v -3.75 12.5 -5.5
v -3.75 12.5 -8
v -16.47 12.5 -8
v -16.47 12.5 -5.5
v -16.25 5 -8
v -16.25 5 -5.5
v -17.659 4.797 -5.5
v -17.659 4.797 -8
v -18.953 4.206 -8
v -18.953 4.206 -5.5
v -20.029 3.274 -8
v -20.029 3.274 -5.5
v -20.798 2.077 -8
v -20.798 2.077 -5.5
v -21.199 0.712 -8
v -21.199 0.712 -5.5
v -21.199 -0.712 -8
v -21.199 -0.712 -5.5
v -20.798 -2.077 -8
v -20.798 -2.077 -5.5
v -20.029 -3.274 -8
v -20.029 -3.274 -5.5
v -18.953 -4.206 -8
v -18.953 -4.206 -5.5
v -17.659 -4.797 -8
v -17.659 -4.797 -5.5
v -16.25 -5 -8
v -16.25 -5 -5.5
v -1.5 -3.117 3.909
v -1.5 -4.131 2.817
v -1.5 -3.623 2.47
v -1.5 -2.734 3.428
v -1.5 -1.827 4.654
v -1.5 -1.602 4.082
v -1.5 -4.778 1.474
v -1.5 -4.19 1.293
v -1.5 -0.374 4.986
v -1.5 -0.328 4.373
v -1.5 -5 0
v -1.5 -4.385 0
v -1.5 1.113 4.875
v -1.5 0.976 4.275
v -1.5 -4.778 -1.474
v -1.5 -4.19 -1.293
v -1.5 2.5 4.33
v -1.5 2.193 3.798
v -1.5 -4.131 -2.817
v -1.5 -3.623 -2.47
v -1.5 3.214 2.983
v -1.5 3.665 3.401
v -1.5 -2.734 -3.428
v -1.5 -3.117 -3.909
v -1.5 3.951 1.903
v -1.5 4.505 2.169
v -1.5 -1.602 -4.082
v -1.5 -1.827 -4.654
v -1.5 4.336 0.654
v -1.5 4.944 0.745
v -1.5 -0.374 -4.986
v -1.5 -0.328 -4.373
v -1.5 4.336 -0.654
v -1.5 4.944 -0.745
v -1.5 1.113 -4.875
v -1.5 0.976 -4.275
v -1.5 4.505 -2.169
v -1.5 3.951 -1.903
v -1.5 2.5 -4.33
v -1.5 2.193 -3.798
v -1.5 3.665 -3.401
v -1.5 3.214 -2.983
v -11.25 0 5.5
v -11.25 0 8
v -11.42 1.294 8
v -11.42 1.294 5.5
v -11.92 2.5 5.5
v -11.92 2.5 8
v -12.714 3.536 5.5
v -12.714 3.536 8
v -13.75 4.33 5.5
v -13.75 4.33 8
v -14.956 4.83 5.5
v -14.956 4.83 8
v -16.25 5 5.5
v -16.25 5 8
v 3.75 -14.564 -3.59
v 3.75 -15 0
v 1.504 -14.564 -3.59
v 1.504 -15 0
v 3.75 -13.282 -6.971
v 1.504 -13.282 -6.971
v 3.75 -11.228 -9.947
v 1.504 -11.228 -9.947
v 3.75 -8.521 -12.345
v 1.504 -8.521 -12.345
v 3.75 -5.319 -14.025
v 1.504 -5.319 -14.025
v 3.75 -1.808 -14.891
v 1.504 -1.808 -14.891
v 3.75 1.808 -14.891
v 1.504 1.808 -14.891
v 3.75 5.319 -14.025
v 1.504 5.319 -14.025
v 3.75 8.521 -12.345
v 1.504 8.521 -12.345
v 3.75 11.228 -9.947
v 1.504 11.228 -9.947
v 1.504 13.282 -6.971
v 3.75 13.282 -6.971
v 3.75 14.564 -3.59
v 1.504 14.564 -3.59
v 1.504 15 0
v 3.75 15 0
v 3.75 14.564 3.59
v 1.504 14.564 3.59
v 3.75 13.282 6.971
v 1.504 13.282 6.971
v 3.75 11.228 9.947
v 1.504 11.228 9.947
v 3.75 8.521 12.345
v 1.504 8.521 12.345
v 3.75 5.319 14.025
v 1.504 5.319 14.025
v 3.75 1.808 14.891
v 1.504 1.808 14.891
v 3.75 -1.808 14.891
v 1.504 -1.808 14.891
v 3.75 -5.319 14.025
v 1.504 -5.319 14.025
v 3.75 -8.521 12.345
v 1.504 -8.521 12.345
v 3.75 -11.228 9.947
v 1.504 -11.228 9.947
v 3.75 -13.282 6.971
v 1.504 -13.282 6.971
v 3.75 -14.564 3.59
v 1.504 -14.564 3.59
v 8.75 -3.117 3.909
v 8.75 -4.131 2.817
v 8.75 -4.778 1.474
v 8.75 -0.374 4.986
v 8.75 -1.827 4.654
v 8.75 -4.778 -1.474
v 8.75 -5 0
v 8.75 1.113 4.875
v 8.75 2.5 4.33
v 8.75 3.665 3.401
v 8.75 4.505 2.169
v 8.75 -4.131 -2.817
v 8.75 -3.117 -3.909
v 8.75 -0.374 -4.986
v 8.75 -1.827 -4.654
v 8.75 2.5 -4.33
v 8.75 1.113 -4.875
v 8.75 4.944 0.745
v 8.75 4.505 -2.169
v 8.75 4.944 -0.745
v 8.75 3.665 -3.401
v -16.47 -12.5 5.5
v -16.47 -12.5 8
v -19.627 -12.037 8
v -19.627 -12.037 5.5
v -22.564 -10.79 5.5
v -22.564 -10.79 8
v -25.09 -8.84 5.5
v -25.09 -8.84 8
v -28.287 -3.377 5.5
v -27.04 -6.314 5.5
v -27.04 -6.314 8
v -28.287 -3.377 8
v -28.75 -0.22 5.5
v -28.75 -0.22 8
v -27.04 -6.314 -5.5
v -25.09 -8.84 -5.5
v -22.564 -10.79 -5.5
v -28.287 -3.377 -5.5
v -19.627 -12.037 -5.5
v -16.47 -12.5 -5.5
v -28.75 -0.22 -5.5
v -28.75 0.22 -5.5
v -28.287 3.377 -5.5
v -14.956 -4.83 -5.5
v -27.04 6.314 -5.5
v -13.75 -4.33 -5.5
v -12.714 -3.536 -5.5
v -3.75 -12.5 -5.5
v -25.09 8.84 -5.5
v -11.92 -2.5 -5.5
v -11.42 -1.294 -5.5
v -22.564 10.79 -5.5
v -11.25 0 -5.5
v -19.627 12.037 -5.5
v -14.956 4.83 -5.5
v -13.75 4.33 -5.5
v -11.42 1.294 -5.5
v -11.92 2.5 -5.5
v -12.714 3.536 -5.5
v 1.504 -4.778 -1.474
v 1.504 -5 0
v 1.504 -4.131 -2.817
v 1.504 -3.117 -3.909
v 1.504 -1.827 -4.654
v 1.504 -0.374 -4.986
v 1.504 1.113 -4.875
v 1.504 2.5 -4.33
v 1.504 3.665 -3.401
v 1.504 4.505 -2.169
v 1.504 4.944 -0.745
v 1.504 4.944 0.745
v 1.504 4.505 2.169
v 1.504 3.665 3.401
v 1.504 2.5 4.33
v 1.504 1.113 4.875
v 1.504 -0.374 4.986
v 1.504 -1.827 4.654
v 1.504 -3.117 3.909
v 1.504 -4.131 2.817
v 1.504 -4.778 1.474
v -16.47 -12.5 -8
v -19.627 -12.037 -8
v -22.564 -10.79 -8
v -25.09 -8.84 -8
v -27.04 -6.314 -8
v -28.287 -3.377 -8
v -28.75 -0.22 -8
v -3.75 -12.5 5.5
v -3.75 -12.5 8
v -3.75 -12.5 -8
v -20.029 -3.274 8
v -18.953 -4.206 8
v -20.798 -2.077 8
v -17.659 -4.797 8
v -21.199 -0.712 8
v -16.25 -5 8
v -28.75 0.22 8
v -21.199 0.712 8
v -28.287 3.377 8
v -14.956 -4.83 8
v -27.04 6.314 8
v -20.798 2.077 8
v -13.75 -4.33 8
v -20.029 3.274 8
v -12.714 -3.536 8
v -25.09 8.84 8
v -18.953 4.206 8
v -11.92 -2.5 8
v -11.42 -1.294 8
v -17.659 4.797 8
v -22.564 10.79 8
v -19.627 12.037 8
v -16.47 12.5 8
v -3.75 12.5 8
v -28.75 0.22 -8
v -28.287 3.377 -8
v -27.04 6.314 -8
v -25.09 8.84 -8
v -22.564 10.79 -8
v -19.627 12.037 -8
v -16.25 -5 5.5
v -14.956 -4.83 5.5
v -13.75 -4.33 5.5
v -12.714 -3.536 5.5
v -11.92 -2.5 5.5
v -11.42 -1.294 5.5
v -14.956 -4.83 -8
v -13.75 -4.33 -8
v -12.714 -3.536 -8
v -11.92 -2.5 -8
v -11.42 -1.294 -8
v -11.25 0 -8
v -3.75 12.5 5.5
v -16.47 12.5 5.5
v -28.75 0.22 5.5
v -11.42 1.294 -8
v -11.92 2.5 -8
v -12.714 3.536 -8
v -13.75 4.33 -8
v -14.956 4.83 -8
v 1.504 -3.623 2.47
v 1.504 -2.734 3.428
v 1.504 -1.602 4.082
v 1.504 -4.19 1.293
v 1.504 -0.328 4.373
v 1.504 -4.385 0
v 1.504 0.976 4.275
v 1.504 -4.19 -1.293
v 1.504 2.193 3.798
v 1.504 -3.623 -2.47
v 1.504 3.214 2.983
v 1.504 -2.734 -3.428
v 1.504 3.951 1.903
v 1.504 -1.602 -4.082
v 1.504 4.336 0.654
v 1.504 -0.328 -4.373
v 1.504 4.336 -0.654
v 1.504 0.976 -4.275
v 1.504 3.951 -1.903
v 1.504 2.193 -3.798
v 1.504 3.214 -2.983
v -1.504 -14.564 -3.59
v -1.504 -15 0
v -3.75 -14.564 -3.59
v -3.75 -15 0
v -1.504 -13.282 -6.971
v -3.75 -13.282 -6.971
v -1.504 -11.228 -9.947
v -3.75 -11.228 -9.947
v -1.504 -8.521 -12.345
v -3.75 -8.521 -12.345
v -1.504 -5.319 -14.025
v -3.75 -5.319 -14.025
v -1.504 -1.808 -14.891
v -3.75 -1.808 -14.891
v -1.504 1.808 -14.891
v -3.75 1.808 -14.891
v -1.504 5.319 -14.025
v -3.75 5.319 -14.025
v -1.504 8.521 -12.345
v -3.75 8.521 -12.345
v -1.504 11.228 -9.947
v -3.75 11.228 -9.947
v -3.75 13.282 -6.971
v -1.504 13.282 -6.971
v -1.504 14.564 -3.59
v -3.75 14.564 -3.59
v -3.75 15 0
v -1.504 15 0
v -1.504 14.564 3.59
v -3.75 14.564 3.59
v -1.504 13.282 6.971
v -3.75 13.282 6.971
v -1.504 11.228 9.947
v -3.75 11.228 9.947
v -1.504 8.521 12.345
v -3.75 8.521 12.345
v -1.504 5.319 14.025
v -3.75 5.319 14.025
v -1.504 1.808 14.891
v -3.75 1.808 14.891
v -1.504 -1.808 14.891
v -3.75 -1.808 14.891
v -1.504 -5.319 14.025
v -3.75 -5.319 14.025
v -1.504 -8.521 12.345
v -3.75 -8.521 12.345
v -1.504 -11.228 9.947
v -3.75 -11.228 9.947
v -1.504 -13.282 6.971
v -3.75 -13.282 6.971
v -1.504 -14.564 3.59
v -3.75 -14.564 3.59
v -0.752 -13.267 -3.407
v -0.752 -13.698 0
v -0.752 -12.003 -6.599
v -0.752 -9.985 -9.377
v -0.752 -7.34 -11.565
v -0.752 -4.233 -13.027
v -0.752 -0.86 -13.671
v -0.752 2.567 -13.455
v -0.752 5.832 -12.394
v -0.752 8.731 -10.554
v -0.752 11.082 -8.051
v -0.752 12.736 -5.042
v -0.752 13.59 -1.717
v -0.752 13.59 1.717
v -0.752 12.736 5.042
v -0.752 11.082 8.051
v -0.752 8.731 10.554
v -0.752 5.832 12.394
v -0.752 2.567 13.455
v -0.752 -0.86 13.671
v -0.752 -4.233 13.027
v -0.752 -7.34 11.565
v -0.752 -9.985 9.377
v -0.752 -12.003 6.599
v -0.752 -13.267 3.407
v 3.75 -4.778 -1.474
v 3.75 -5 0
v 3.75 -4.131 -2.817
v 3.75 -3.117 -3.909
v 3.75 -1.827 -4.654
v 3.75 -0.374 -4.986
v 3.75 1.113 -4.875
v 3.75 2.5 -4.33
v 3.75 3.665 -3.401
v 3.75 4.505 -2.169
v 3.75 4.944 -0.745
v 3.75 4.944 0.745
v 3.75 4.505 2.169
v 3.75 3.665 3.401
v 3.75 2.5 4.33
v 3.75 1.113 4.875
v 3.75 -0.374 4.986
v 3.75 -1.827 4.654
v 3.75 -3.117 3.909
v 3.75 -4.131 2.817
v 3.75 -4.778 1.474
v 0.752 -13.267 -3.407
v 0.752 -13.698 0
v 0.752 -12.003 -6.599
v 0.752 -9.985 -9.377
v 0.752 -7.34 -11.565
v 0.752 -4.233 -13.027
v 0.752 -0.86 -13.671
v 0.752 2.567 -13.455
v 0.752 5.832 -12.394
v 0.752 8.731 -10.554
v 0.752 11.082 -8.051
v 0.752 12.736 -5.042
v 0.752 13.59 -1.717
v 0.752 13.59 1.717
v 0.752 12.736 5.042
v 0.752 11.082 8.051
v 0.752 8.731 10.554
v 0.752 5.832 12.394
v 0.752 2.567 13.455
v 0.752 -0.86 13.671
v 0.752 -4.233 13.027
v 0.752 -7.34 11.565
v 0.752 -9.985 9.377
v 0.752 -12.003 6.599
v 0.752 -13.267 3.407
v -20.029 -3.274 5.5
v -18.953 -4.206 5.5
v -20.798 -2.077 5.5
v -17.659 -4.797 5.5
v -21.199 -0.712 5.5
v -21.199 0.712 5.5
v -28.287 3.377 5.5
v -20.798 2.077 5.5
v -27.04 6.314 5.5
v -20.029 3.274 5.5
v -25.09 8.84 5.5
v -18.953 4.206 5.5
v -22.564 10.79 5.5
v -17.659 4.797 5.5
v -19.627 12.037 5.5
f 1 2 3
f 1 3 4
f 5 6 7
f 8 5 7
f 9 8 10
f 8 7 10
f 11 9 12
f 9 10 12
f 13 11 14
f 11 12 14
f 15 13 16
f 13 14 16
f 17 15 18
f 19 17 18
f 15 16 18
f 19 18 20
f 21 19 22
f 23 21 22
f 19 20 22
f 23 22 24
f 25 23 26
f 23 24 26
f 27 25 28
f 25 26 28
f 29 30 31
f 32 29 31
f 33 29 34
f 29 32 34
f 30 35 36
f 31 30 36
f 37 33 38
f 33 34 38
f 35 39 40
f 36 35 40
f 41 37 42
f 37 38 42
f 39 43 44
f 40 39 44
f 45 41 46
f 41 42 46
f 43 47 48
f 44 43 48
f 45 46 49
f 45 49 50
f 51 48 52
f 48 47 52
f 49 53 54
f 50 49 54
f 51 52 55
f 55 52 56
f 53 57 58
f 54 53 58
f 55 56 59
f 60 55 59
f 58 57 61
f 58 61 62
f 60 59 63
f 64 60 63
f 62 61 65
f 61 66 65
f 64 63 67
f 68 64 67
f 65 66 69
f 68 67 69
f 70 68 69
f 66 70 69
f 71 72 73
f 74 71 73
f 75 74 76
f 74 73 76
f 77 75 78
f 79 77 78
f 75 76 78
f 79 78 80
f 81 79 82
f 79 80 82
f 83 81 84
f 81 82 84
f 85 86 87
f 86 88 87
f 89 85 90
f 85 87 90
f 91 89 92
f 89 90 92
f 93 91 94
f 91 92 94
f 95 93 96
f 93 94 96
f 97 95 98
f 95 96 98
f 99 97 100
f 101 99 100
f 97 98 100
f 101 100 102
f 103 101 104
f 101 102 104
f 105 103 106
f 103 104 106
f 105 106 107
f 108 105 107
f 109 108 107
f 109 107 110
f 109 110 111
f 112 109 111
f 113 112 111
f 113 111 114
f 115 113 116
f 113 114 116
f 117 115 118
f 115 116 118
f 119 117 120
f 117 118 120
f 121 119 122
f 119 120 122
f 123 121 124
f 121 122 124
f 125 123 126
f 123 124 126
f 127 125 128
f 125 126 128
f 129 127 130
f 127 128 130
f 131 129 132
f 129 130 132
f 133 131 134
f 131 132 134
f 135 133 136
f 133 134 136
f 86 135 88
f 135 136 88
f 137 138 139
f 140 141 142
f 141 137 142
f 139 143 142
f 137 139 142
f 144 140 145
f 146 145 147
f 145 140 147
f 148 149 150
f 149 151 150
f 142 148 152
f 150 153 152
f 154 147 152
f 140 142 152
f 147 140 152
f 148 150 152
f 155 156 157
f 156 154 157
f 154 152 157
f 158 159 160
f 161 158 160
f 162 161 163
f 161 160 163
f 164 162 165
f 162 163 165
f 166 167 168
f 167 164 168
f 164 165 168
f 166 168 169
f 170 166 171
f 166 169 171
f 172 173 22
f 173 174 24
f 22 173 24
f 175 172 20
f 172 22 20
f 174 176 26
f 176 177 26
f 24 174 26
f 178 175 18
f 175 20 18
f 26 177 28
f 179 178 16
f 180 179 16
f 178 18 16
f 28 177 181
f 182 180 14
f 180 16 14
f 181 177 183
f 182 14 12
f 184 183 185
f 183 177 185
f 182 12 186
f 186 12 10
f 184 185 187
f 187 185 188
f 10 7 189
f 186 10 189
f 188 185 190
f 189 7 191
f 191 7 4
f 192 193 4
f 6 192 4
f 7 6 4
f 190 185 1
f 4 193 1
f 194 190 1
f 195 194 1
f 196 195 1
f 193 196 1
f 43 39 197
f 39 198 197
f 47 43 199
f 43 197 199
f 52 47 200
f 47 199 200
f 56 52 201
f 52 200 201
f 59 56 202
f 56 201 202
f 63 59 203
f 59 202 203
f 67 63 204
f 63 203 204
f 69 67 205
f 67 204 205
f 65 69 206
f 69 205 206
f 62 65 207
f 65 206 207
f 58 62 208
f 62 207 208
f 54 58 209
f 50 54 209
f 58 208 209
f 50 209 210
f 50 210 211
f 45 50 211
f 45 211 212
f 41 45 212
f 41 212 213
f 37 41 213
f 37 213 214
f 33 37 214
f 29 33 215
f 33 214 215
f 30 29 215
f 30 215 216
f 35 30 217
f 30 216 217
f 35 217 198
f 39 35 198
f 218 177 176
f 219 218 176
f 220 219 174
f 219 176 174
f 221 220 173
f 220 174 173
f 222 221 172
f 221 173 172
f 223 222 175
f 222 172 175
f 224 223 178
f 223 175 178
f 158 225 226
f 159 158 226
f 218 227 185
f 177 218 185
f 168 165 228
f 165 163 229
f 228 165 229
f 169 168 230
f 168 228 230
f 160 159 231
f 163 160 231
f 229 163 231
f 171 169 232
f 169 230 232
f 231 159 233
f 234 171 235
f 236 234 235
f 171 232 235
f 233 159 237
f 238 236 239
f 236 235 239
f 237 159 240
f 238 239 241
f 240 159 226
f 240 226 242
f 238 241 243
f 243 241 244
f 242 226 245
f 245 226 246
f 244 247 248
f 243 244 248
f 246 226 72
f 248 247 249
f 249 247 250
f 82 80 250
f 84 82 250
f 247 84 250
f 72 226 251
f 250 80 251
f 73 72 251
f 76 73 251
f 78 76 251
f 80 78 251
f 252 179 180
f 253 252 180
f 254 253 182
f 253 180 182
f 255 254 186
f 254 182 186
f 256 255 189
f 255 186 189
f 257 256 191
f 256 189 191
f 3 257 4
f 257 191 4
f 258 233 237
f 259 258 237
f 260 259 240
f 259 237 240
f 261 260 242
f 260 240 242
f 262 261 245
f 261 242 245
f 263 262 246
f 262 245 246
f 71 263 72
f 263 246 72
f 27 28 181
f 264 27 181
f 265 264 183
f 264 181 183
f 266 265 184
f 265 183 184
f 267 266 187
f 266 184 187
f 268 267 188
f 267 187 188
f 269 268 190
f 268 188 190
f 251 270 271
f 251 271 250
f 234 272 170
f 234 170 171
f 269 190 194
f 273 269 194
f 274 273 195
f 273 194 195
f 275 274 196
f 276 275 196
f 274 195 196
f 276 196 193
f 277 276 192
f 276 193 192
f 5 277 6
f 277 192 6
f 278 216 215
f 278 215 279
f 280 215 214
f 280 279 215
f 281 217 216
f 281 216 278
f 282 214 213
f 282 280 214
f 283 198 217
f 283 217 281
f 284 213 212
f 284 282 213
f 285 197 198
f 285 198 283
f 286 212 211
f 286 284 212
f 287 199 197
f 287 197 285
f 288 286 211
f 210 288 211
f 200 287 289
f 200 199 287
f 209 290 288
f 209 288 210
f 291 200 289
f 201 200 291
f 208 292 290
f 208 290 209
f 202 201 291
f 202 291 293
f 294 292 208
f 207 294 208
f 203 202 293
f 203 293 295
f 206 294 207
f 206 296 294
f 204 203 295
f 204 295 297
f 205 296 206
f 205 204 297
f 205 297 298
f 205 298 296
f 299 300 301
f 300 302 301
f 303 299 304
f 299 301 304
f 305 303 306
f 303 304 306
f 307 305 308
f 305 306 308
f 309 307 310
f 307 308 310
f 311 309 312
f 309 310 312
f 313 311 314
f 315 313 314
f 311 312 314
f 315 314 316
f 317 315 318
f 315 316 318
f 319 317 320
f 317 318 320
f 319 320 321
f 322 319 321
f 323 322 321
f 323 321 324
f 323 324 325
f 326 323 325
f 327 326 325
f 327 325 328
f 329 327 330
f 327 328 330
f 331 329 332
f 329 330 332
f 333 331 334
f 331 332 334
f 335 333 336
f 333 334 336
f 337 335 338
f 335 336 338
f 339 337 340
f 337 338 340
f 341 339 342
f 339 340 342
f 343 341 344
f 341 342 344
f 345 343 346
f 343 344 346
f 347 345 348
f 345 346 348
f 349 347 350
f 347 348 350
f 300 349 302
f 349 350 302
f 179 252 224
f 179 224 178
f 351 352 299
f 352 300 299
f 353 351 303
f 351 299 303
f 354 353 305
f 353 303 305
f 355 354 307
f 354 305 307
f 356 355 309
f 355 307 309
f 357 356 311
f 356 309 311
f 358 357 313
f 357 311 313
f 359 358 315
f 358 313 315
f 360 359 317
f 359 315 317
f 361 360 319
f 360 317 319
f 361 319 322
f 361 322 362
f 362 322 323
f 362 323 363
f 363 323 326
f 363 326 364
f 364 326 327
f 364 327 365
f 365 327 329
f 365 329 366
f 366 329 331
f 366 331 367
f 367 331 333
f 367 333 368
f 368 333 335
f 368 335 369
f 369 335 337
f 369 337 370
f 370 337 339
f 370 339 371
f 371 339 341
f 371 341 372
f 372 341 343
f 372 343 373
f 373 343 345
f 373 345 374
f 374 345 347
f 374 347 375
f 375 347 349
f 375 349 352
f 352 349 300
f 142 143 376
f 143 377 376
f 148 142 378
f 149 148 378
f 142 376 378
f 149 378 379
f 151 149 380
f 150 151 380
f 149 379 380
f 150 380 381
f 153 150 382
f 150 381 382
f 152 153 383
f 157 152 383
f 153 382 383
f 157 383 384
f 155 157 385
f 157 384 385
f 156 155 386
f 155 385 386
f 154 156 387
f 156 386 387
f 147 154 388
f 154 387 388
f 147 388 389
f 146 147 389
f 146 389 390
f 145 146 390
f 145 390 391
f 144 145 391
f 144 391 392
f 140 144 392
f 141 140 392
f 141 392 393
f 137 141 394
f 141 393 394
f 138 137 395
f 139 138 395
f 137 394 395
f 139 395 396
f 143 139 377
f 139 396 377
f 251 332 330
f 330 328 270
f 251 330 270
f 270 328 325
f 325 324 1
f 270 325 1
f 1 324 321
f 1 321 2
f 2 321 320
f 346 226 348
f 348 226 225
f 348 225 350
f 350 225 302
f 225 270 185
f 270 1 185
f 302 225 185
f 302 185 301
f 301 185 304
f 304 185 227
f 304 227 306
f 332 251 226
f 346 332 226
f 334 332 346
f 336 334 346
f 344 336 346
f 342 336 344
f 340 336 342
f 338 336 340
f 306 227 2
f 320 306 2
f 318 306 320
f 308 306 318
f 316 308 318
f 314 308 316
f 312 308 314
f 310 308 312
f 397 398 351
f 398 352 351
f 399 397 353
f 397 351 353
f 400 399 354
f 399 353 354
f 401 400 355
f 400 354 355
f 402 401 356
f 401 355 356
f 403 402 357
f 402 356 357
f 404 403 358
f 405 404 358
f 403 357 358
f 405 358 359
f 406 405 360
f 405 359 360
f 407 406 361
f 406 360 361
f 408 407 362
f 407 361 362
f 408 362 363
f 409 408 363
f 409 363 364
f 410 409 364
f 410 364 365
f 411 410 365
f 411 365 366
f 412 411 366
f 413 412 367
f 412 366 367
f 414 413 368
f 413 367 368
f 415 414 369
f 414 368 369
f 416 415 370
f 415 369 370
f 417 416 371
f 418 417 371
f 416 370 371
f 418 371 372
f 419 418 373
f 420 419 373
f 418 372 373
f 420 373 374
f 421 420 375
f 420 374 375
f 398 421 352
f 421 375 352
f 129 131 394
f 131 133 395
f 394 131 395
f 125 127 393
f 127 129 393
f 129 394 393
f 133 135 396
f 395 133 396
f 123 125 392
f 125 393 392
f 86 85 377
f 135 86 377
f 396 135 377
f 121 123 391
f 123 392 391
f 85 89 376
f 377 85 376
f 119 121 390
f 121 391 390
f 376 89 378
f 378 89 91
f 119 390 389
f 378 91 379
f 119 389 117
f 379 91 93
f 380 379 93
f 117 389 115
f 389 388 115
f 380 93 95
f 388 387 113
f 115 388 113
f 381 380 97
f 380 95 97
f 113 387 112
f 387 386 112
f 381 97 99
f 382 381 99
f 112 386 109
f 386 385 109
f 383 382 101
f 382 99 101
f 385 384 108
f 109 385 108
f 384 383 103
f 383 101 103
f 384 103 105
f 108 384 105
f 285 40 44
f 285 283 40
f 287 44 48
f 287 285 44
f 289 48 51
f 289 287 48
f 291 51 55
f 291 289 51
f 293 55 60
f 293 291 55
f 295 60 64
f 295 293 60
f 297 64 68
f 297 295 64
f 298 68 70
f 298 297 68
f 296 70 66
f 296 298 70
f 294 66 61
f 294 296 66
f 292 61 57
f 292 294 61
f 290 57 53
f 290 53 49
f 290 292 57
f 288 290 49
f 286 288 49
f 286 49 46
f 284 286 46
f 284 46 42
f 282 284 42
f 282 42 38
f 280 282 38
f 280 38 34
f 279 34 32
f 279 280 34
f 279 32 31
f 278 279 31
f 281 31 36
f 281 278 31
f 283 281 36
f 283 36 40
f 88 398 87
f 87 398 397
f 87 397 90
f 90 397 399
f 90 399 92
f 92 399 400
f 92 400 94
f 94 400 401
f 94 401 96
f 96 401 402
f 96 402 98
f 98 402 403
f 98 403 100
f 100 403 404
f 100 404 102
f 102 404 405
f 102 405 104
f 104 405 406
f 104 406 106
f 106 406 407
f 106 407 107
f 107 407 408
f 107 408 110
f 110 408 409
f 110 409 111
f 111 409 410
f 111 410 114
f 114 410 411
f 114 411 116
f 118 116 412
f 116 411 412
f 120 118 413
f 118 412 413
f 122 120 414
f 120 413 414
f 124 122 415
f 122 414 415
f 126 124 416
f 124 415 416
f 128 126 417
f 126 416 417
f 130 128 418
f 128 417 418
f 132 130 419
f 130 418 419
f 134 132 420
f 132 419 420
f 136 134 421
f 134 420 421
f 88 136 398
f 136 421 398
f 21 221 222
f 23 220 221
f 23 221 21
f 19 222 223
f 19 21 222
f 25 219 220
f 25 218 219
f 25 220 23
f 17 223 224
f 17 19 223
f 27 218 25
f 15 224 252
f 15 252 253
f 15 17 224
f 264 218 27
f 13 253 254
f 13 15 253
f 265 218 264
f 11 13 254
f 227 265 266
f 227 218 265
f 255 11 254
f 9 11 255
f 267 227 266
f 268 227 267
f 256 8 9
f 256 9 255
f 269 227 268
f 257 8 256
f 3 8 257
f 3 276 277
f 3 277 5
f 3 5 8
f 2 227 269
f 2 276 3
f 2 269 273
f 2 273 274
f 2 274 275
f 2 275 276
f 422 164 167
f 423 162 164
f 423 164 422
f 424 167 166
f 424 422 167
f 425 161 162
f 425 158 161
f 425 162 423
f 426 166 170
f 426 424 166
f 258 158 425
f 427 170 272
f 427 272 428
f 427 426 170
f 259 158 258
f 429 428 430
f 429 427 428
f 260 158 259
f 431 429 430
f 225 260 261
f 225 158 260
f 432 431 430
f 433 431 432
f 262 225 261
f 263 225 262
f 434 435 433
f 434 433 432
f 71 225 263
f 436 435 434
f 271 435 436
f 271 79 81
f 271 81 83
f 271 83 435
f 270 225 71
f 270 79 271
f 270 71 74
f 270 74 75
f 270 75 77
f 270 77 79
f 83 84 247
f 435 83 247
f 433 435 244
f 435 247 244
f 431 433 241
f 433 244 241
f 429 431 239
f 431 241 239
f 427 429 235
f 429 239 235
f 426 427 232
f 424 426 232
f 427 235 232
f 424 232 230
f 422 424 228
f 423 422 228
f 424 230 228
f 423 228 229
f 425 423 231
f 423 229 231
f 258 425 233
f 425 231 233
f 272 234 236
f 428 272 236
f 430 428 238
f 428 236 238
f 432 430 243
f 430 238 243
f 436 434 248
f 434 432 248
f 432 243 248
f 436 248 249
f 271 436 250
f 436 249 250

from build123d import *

# Parameters (mm, degrees)
CROQUIS1_ONE_SIDE_W     = 3.003658151
CROQUIS1_ONE_SIDE_H     = 0.614983514
CROQUIS2_W              = 2.5
CROQUIS2_H              = 25
SALIENTE_EXTRUIR1_DEPTH = 25
CORTAR_EXTRUIR1_DEPTH   = 25


with BuildPart() as part:
    # Croquis1 one side → Revolución1 (revolve)
    with BuildSketch(Plane.XY, mode=Mode.PRIVATE) as revoluci_n1_sk:
        Polygon((-3.75, 15), (-3.75, 0), (3.75, 0), (8.75, 0), (8.75, 5), (3.75, 5), (3.75, 15), (1.503658151, 15), (0.751829076, 13.697793843), (-0.751829076, 13.697793843), (-1.503658151, 15), align=None)
        with Locations((0.001829075, 4.692508243)):
            Rectangle(CROQUIS1_ONE_SIDE_W, CROQUIS1_ONE_SIDE_H, mode=Mode.SUBTRACT)
    revolve(revoluci_n1_sk.sketch.rotate(Axis((-10.104371621, 0, 0), (1, 0, 0)), 180), axis=Axis((-10.104371621, 0, 0), (1, 0, 0)))

    # Croquis2 → Saliente-Extruir1 (add)
    with BuildSketch(Plane.ZY.offset(3.75)):
        with Locations((-6.75, 0)):
            Rectangle(CROQUIS2_W, CROQUIS2_H)
        with Locations((6.75, 0)):
            Rectangle(CROQUIS2_W, CROQUIS2_H)
    extrude(amount=SALIENTE_EXTRUIR1_DEPTH)

    # Croquis3 → Cortar-Extruir1 (cut)
    with BuildSketch(Plane.XY.offset(8)):
        with BuildLine():
            Line((-16.469719797, 12.5), (-28.75, 12.5))
            Line((-28.75, 12.5), (-28.75, 0.219719797))
            ThreePointArc((-28.75, 0.219719797), (-25.090200133, 8.840200133), (-16.469719797, 12.5))
        make_face()
        with BuildLine():
            Line((-28.75, -0.219719797), (-28.75, -12.5))
            Line((-28.75, -12.5), (-16.469719797, -12.5))
            ThreePointArc((-16.469719797, -12.5), (-25.090200133, -8.840200133), (-28.75, -0.219719797))
        make_face()
        with BuildLine():
            ThreePointArc((-11.25, 0), (-12.714466094, 3.535533906), (-16.25, 5))
            Line((-16.25, 5), (-16.25, -5))
            ThreePointArc((-16.25, -5), (-12.714466094, -3.535533906), (-11.25, 0))
        make_face()
        with BuildLine():
            Line((-16.25, -5), (-16.25, 5))
            ThreePointArc((-16.25, 5), (-21.25, 0), (-16.25, -5))
        make_face()
    extrude(amount=-CORTAR_EXTRUIR1_DEPTH, mode=Mode.SUBTRACT)


solid = part.part
